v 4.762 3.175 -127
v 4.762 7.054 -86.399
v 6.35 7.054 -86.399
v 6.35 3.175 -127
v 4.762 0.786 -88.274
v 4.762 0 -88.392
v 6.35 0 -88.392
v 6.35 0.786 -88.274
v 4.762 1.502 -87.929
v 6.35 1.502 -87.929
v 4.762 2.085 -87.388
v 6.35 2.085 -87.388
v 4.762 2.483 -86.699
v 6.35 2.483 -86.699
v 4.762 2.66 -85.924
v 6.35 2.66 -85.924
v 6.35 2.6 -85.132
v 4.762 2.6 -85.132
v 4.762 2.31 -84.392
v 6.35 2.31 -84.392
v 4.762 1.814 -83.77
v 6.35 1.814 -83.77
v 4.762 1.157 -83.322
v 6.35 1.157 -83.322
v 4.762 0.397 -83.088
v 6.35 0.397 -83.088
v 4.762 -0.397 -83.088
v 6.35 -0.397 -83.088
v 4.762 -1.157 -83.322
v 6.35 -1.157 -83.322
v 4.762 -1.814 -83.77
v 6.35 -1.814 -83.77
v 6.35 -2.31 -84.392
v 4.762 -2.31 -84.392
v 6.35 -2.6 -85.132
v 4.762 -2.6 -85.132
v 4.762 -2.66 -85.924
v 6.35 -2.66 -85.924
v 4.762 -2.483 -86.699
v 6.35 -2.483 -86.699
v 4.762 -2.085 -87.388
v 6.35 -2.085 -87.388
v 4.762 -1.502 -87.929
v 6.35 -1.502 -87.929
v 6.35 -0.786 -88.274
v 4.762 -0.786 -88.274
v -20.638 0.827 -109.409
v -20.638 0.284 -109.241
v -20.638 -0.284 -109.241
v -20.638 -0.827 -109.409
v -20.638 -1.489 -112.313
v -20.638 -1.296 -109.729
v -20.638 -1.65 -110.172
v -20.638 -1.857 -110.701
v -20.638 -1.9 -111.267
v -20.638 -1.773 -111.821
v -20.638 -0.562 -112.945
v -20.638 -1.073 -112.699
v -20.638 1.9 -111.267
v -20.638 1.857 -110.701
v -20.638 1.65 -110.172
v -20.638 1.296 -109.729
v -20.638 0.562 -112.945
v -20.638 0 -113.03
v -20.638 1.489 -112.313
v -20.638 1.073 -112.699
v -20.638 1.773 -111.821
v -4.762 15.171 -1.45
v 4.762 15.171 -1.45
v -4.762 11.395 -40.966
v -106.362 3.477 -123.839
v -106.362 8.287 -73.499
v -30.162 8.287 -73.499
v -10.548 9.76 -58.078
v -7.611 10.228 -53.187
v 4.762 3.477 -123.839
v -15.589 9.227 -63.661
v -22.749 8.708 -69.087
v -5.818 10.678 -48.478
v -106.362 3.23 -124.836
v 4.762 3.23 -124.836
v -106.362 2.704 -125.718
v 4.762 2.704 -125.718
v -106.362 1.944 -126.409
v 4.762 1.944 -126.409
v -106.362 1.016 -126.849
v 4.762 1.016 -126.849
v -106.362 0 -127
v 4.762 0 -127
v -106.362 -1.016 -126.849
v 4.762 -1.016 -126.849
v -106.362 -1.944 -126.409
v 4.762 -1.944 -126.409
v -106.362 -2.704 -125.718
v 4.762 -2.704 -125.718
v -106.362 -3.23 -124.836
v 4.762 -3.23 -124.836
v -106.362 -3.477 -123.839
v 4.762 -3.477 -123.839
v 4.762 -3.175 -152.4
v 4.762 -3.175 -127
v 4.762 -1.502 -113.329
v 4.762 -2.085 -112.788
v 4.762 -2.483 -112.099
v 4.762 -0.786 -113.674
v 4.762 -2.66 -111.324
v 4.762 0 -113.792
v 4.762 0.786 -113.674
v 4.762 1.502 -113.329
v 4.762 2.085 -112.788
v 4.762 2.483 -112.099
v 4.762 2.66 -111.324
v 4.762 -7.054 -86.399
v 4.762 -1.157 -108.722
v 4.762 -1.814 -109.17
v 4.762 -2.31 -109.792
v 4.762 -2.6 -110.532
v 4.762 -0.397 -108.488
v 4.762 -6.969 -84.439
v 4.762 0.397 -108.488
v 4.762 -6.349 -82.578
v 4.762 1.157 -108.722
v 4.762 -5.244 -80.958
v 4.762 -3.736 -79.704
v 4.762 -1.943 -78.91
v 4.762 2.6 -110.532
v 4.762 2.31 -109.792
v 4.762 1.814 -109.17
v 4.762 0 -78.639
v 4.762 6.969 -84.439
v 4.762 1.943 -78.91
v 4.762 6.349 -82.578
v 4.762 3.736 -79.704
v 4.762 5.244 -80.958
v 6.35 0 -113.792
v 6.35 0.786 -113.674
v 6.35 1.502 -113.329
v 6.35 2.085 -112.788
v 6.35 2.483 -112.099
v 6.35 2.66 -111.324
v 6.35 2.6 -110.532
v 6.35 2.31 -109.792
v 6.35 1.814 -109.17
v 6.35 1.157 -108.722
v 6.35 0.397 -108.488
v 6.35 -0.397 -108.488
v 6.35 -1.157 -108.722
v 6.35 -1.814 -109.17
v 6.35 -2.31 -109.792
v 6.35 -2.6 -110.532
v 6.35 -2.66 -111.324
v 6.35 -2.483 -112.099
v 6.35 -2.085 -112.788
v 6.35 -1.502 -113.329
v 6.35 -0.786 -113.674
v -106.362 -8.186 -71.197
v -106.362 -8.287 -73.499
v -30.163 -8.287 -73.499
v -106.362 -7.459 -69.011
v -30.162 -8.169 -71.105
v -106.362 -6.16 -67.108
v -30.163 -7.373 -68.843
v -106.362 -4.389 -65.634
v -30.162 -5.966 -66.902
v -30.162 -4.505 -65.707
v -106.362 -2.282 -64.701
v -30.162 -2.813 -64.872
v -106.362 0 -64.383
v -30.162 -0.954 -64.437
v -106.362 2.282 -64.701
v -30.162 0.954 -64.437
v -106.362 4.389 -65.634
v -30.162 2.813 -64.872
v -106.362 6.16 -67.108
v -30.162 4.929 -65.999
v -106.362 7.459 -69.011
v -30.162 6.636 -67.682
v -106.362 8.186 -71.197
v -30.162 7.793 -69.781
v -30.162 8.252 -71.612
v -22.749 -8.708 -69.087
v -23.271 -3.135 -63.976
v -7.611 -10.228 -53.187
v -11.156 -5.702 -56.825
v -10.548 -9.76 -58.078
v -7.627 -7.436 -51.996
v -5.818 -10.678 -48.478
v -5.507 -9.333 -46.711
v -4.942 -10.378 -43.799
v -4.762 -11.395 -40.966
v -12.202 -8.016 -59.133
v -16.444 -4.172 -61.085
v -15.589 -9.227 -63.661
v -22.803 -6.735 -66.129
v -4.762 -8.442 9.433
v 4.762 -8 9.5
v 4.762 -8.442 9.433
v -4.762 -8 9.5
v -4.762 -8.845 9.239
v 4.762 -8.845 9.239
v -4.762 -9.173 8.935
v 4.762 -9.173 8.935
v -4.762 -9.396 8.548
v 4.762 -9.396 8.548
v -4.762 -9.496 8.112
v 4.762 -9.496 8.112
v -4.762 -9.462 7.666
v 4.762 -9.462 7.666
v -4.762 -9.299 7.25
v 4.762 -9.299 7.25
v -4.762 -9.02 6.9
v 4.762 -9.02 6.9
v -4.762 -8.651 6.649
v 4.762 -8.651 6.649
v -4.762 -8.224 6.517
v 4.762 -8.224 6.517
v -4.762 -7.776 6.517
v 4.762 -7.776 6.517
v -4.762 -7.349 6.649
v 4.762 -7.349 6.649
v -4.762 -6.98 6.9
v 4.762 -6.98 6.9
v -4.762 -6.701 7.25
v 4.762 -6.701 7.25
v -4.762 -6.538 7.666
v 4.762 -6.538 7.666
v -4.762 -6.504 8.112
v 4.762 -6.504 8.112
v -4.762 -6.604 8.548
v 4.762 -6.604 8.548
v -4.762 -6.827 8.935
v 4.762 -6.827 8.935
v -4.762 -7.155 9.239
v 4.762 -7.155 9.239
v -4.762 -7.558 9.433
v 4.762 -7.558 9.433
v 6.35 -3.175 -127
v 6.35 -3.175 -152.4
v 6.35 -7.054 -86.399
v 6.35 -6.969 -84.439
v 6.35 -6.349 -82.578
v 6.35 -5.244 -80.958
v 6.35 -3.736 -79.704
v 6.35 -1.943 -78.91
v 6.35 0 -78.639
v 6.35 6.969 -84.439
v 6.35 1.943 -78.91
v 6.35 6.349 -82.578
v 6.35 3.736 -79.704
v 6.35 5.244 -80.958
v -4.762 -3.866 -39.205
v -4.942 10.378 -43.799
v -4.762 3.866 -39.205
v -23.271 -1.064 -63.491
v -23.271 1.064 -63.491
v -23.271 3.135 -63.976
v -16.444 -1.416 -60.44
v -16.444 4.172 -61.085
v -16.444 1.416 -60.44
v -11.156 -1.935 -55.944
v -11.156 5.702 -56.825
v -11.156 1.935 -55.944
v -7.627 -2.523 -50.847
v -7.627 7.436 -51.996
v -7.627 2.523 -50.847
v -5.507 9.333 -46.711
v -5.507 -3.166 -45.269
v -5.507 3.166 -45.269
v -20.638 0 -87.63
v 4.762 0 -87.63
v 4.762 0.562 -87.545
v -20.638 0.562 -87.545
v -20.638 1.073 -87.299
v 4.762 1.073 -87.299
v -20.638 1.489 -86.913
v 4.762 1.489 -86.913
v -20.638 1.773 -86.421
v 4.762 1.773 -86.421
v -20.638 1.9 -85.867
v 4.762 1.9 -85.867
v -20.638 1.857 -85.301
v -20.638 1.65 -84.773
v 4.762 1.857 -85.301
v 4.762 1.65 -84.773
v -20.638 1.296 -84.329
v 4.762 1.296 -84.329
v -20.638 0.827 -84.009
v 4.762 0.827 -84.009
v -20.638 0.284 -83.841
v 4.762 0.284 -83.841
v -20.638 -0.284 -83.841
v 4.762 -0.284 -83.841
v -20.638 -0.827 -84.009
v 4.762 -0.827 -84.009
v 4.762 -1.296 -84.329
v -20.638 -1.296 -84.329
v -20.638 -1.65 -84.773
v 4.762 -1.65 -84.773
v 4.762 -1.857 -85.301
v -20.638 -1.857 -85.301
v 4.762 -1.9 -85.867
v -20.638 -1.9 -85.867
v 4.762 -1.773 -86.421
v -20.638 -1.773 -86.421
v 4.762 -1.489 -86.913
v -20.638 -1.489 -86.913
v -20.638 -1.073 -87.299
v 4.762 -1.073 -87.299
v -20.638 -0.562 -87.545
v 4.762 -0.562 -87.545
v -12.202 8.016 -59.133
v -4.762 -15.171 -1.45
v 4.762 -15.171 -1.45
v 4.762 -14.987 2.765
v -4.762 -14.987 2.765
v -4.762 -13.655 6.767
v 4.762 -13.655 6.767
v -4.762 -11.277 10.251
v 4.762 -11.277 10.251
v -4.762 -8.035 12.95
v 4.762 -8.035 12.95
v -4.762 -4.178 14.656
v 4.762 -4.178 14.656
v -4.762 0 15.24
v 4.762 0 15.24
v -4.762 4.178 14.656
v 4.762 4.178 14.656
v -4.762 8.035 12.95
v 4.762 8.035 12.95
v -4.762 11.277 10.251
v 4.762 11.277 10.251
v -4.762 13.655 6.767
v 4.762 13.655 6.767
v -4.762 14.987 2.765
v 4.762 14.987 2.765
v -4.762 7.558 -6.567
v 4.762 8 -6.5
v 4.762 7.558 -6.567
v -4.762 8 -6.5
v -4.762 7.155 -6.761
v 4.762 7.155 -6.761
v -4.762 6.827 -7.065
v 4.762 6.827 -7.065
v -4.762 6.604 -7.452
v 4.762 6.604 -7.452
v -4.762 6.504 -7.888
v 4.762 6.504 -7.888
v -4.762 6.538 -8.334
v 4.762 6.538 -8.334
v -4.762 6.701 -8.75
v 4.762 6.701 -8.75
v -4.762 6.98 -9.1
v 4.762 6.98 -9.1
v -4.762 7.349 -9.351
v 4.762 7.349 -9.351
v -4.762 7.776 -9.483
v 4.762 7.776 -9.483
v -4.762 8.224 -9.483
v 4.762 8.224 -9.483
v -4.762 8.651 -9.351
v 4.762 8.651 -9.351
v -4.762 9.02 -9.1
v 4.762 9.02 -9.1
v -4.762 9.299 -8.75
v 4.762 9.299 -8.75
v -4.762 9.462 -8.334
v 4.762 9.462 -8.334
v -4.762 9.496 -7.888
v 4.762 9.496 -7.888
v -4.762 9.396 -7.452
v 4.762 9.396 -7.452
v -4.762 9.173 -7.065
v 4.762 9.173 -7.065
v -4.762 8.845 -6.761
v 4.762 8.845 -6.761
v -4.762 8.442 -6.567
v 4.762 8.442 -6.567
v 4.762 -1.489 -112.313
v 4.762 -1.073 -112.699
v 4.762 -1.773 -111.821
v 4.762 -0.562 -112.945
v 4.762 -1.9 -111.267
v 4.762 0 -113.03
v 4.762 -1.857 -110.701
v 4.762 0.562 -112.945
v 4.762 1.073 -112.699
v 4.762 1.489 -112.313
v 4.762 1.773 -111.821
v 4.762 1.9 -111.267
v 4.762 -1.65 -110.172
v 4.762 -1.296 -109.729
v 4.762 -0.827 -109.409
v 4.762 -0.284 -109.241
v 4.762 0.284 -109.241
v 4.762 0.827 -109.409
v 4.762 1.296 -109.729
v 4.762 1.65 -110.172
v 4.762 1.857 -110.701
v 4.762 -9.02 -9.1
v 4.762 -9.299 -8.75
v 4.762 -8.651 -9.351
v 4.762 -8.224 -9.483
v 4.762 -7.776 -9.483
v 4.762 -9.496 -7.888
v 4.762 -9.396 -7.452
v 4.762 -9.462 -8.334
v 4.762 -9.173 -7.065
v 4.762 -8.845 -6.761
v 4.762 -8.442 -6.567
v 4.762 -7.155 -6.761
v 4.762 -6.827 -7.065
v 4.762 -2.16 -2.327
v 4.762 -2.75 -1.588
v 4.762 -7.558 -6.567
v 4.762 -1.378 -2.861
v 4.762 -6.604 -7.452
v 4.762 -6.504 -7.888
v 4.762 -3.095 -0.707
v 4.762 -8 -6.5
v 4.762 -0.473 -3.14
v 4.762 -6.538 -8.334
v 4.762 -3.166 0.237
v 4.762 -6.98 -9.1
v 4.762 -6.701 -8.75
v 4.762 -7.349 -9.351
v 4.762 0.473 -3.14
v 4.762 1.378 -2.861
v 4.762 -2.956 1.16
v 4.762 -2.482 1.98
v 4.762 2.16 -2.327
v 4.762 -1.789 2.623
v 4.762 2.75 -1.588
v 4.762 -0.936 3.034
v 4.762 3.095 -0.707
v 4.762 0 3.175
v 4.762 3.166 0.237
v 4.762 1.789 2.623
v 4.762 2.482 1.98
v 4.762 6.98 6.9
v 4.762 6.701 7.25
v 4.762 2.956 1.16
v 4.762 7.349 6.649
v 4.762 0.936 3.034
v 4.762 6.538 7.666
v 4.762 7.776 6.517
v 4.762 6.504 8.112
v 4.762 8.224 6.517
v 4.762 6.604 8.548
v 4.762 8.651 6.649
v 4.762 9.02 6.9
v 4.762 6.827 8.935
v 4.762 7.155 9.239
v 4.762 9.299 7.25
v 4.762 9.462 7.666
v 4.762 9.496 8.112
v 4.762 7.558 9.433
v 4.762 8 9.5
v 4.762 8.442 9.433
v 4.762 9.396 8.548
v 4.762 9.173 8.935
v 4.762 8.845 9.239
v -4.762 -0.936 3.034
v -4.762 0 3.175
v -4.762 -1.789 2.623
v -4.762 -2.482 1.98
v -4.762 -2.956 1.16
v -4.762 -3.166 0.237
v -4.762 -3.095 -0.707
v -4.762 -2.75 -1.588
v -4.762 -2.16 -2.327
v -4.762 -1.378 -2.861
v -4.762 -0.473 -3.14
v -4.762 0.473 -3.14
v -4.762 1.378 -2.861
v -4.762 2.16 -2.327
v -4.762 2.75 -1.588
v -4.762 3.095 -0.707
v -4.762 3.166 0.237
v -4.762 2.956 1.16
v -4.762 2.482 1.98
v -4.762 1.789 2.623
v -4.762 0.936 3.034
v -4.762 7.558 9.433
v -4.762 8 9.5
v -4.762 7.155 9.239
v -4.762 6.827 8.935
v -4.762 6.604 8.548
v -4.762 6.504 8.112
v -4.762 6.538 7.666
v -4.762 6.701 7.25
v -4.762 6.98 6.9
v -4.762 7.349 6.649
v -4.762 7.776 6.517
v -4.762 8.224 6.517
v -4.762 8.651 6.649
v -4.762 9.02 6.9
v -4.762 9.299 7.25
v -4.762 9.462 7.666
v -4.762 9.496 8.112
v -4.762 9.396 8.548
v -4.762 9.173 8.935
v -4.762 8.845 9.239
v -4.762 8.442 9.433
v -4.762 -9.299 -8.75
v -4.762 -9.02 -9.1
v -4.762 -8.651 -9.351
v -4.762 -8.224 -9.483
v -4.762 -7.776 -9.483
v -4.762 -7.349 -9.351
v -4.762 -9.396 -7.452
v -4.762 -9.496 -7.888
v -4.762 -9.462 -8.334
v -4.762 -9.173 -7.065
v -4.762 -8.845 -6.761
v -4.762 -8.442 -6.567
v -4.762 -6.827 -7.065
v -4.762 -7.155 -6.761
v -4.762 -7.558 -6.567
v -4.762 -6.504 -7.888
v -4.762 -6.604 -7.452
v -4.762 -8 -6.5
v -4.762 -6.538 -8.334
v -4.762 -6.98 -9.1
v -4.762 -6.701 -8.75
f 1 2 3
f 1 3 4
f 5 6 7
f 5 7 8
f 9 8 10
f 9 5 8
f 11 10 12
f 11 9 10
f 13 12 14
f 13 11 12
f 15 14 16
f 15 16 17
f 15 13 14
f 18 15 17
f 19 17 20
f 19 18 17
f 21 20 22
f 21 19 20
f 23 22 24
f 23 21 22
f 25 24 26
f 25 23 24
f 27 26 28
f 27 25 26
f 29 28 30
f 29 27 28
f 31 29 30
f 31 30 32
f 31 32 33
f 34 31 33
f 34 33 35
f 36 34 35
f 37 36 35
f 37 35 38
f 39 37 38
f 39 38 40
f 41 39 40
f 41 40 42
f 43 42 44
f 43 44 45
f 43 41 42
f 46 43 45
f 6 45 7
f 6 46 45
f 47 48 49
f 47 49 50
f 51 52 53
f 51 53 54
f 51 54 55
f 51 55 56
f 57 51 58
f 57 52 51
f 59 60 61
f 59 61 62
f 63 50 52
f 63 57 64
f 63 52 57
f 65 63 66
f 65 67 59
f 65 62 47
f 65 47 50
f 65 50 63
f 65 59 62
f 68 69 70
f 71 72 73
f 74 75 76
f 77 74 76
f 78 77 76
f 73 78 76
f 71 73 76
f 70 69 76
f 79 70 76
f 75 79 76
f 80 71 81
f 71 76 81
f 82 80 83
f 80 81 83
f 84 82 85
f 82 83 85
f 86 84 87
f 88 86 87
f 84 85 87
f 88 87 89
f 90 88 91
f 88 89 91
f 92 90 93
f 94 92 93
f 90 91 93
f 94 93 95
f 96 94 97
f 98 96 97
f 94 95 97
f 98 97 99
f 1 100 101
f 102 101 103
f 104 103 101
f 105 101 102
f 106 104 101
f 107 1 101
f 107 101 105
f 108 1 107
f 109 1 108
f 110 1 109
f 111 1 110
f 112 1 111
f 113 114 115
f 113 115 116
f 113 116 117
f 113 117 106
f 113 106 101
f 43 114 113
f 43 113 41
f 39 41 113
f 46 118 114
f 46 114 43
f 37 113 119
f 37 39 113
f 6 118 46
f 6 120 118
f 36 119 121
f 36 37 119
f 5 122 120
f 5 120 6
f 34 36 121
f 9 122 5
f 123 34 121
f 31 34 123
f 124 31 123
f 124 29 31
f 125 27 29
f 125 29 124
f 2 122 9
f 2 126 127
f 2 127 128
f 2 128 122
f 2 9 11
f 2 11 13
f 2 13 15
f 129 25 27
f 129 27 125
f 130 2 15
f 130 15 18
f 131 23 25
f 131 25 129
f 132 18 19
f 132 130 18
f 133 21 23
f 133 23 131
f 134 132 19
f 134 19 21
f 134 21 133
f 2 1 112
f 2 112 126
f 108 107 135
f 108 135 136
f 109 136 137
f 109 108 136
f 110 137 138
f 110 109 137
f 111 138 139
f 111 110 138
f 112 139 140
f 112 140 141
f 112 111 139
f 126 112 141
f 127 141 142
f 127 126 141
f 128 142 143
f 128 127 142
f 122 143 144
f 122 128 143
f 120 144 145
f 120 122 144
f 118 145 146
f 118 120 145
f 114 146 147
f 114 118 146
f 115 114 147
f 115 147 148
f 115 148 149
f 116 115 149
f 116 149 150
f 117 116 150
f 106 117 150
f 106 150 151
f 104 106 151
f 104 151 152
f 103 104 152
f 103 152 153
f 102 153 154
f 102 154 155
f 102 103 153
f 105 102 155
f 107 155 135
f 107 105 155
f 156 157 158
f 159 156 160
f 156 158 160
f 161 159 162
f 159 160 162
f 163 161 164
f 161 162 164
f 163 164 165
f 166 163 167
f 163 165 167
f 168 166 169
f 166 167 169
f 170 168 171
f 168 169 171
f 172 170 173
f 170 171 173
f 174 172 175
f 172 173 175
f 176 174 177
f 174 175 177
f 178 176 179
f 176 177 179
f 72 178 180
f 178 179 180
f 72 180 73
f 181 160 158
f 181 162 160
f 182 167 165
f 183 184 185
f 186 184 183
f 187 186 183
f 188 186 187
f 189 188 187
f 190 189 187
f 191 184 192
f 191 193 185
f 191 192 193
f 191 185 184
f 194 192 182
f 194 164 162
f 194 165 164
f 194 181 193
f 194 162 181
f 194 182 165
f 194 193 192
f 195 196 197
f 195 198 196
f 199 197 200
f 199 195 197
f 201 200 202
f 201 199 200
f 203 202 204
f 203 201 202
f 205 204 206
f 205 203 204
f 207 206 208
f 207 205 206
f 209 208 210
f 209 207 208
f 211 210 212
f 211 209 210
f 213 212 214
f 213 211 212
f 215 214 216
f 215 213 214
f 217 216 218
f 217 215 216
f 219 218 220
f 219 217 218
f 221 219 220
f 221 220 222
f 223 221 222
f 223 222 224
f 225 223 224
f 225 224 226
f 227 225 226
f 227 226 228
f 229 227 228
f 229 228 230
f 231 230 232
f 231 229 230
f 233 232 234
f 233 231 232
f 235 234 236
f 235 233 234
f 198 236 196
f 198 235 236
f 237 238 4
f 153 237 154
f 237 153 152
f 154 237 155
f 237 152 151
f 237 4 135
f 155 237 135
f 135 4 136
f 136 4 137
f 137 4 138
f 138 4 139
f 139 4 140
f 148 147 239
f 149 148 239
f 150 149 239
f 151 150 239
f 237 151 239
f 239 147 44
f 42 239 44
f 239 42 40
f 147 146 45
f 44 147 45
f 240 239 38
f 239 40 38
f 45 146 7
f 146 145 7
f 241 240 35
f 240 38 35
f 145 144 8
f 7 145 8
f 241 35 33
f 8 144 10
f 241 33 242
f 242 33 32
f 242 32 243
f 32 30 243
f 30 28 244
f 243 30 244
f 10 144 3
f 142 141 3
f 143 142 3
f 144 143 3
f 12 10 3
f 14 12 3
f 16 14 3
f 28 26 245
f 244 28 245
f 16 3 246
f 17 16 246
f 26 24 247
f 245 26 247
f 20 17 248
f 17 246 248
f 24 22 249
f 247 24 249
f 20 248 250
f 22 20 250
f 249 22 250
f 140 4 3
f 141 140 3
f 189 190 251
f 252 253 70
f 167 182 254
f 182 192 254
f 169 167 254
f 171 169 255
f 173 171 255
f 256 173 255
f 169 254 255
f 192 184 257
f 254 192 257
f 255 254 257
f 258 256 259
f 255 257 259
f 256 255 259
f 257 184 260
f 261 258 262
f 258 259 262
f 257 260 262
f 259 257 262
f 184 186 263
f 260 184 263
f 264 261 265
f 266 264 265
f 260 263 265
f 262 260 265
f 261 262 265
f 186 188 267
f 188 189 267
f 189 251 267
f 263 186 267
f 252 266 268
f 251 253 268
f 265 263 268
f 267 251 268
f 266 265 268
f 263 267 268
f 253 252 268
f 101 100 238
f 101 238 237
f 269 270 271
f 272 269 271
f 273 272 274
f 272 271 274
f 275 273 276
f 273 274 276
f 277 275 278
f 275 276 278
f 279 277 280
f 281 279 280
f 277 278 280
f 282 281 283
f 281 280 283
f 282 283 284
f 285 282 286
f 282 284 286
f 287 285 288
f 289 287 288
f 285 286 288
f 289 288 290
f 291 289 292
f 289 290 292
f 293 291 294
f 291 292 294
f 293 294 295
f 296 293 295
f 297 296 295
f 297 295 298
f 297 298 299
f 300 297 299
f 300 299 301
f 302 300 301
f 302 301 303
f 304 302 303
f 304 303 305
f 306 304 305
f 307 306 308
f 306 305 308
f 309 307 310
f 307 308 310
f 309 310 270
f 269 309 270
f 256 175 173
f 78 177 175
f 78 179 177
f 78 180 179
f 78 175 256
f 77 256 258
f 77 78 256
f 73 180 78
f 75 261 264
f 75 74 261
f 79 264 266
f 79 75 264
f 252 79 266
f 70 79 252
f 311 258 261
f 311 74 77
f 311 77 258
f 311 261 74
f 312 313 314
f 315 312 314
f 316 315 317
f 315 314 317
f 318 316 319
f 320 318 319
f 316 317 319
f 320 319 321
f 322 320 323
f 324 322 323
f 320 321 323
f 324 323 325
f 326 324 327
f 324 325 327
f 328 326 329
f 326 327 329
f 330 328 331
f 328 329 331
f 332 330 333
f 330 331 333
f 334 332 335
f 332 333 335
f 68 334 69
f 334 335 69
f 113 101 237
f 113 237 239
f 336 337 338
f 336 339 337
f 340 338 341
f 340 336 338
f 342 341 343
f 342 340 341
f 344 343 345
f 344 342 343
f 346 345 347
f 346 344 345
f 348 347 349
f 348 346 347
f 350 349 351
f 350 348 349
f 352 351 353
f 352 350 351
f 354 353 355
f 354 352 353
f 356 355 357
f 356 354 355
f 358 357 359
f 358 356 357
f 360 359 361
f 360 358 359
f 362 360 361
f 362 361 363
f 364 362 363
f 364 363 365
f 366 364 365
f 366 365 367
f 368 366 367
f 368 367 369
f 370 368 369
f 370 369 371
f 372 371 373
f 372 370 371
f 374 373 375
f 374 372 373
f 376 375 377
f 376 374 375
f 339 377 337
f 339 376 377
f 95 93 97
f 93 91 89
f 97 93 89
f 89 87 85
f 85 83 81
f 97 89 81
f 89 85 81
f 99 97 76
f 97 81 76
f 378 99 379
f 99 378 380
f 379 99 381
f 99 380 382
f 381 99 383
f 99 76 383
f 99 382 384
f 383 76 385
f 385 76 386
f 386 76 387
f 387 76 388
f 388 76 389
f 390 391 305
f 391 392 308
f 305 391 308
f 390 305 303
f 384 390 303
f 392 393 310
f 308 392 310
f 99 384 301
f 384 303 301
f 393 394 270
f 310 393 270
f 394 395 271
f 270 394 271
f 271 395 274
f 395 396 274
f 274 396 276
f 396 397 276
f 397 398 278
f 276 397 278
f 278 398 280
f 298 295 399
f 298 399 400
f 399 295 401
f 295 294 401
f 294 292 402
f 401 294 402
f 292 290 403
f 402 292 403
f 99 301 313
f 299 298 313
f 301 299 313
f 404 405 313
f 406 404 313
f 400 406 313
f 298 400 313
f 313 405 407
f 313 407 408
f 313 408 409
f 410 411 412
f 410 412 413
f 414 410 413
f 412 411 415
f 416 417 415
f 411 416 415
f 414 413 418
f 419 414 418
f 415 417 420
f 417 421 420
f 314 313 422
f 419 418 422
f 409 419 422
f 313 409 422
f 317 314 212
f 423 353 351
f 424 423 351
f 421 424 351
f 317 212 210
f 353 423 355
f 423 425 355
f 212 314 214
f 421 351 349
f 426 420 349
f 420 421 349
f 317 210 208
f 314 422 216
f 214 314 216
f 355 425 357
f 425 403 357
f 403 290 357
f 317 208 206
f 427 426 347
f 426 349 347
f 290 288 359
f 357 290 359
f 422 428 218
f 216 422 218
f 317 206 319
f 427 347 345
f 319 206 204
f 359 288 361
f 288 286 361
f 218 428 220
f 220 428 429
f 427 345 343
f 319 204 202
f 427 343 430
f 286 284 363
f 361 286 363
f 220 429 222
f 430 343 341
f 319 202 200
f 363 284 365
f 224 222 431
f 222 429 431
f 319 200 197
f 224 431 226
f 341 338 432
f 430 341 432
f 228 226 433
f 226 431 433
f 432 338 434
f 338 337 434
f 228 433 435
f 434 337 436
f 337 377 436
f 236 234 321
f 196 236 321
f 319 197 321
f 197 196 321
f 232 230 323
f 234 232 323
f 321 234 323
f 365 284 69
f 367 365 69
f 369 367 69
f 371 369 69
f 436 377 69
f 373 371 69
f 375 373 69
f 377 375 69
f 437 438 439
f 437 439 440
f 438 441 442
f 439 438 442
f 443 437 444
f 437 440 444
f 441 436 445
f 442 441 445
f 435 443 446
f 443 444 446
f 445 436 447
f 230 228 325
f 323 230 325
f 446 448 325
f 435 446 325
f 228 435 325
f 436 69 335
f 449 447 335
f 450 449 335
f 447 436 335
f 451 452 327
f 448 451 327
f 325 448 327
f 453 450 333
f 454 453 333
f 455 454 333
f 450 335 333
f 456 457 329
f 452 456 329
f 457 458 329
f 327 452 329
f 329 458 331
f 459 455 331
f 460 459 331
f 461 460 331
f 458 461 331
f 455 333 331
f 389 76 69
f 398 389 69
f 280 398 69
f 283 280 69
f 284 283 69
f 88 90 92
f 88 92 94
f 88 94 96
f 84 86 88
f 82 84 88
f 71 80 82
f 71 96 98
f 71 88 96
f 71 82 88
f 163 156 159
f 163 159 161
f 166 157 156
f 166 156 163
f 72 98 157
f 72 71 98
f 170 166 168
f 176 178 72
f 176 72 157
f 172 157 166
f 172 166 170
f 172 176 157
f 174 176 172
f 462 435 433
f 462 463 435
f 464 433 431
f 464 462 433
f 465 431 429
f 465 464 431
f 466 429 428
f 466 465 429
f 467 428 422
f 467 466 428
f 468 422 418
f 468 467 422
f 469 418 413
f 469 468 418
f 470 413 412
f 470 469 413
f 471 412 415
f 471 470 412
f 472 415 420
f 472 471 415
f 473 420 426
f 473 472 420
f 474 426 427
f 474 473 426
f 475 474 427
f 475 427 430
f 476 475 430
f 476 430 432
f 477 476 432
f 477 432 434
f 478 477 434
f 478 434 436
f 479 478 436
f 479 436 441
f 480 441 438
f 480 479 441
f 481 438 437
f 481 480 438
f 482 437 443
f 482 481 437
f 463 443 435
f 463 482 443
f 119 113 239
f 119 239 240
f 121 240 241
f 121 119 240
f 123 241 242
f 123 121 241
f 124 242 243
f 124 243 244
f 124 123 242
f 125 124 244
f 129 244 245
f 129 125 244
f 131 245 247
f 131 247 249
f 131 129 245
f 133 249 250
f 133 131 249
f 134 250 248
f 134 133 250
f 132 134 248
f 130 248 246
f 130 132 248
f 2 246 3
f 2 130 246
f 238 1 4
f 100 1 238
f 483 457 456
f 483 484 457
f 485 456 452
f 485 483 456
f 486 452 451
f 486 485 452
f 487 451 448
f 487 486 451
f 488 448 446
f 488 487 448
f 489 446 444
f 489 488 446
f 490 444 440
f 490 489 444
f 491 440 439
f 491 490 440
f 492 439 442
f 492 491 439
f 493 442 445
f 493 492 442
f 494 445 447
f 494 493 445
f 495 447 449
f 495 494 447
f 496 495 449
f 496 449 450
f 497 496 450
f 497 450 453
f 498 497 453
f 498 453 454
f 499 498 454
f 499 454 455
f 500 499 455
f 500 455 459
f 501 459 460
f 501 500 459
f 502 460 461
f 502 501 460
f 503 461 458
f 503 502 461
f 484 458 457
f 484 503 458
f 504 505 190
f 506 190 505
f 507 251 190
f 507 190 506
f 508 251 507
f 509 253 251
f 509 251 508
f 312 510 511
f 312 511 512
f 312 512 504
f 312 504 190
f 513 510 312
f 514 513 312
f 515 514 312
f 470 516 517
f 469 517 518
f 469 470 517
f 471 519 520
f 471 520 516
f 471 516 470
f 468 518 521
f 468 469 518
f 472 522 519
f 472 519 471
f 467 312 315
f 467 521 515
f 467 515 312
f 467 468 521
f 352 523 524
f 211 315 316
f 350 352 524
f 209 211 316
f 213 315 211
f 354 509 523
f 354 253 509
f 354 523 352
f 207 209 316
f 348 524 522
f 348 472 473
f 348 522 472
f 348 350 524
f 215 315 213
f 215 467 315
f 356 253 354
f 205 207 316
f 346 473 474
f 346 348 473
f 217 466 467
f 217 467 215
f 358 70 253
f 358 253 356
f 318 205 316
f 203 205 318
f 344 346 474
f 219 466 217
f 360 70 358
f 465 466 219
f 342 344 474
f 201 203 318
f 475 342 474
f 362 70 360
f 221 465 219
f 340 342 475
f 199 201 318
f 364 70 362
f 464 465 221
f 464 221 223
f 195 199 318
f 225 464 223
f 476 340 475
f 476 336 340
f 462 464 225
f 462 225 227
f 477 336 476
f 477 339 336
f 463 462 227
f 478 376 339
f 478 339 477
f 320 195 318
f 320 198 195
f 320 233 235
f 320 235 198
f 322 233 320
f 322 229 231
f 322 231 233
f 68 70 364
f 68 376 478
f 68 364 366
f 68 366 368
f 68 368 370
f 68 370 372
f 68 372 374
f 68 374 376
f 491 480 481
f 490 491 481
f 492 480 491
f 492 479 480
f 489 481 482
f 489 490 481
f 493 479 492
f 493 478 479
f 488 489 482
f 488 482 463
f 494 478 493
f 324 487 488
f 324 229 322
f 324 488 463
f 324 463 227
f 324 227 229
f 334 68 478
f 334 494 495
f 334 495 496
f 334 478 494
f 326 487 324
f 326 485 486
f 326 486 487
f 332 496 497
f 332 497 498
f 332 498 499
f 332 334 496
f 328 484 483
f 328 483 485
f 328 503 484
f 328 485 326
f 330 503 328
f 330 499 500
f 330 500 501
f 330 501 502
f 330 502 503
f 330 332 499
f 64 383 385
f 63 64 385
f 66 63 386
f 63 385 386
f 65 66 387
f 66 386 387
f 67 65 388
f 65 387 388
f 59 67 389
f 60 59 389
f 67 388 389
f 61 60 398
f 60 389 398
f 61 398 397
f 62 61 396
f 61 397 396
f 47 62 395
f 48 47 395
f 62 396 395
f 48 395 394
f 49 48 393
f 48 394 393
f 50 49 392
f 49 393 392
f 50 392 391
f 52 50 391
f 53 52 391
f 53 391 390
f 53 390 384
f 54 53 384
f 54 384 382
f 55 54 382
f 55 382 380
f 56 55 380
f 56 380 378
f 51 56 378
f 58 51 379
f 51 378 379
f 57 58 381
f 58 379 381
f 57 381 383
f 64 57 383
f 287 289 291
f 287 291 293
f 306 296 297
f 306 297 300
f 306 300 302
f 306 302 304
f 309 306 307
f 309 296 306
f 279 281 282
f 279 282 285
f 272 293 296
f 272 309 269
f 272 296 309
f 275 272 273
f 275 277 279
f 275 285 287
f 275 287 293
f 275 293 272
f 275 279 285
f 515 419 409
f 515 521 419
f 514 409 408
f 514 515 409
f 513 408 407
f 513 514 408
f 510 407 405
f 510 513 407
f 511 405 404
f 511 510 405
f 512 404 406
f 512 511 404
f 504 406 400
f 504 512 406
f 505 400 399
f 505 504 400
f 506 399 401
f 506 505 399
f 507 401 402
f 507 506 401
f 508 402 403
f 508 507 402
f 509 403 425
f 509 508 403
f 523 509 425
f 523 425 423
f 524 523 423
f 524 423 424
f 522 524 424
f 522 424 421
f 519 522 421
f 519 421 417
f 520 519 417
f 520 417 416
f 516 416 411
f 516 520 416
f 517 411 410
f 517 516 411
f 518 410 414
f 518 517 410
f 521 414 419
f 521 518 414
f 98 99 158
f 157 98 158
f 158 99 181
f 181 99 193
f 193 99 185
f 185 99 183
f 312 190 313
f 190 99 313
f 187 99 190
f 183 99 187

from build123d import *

# Parameters (mm, degrees)
SKETCH1_R           = 3.175
SKETCH1_R_2         = 1.4999999999999996
SKETCH1_R_3         = 1.4999999999999987
BOSS_EXTRUDE1_DEPTH = 4.7625
BOSS_EXTRUDE2_DEPTH = 101.6
SKETCH4_R           = 2.6669999999999963
BOSS_EXTRUDE3_DEPTH = 1.5875
SKETCH5_R           = 1.9050000000000071
CUT_EXTRUDE1_DEPTH  = 25.4
FILLET1_R           = 25.4


with BuildPart() as part:
    # Sketch1 → Boss-Extrude1 (new, symmetric)
    with BuildSketch(Plane(origin=(0, 0, 0), x_dir=(0, 0, -1), z_dir=(1, 0, 0))):
        with BuildLine():
            Line((1.449527282604434, 15.170908695822588), (123.83939402170368, 3.476984850542586))
            ThreePointArc((123.83939402170368, 3.476984850542586), (127.00000000000004, 0), (123.83939402170368, -3.476984850542586))
            Line((123.83939402170368, -3.476984850542586), (1.449527282604434, -15.170908695822588))
            ThreePointArc((1.449527282604434, -15.170908695822588), (-15.24, 1.87e-15), (1.449527282604434, 15.170908695822588))
        make_face()
        with Locations(Location((0, 0, 0), (0, 0, 180))):
            Circle(SKETCH1_R, mode=Mode.SUBTRACT)
        with Locations(Location((-8.000000000000005, 8.000000000000002, 0), (0, 0, 180))):
            Circle(SKETCH1_R_2, mode=Mode.SUBTRACT)
        with Locations(Location((7.999999999999998, 8.000000000000002, 0), (0, 0, 180))):
            Circle(SKETCH1_R_3, mode=Mode.SUBTRACT)
        with Locations(Location((7.999999999999998, -7.999999999999998, 0), (0, 0, 180))):
            Circle(SKETCH1_R_3, mode=Mode.SUBTRACT)
        with Locations(Location((-8.000000000000002, -7.999999999999998, 0), (0, 0, 180))):
            Circle(SKETCH1_R_2, mode=Mode.SUBTRACT)
    extrude(amount=BOSS_EXTRUDE1_DEPTH, both=True)

    # Sketch3 → Boss-Extrude2 (add)
    with BuildSketch(Plane.ZY.offset(4.7625)):
        with BuildLine():
            Line((-73.49895861991335, 8.286837443826865), (-123.83939402170368, 3.476984850542586))
            ThreePointArc((-123.83939402170368, 3.476984850542586), (-127.00000000000004, 4.3e-16), (-123.83939402170368, -3.476984850542586))
            Line((-123.83939402170368, -3.476984850542586), (-73.49895861991335, -8.286837443826865))
            ThreePointArc((-73.49895861991335, -8.286837443826865), (-64.38260294351677, 0), (-73.49895861991335, 8.286837443826865))
        make_face()
    extrude(amount=BOSS_EXTRUDE2_DEPTH)

    # Sketch5 → Cut-Extrude1 (cut)
    with BuildSketch(Plane(origin=(4.7625, 0, 0), x_dir=(0, 0, -1), z_dir=(1, 0, 0))):
        with Locations((85.72500000000001, 0)):
            Circle(SKETCH5_R)
        with Locations((111.125, 0)):
            Circle(SKETCH5_R)
    extrude(amount=-CUT_EXTRUDE1_DEPTH, mode=Mode.SUBTRACT)

    # Fillet1
    fillet1_edges = [part.edges().sort_by_distance(p)[0] for p in [
        (-4.7625, 4.4e-16, -64.38260294351677),
    ]]
    fillet(fillet1_edges, radius=FILLET1_R)


with BuildPart() as body_2:
    # Sketch4 → Boss-Extrude3 (new body)
    with BuildSketch(Plane(origin=(4.7625, 0, 0), x_dir=(0, 0, -1), z_dir=(1, 0, 0))):
        with BuildLine():
            Line((127, 3.175), (152.4, -3.174999999999997))
            Line((152.4, -3.174999999999997), (127, -3.175))
            Line((127, -3.175), (86.39901202312564, -7.054282444655376))
            ThreePointArc((86.39901202312564, -7.054282444655376), (78.63859096464995, -8.7e-16), (86.39901202312564, 7.05428244465537))
            Line((86.39901202312564, 7.05428244465537), (127, 3.175))
        make_face()
        with Locations((111.125, 0)):
            Circle(SKETCH4_R, mode=Mode.SUBTRACT)
        with Locations((85.72500000000001, 0)):
            Circle(SKETCH4_R, mode=Mode.SUBTRACT)
    extrude(amount=BOSS_EXTRUDE3_DEPTH)


solid = Compound([part.part, body_2.part])
